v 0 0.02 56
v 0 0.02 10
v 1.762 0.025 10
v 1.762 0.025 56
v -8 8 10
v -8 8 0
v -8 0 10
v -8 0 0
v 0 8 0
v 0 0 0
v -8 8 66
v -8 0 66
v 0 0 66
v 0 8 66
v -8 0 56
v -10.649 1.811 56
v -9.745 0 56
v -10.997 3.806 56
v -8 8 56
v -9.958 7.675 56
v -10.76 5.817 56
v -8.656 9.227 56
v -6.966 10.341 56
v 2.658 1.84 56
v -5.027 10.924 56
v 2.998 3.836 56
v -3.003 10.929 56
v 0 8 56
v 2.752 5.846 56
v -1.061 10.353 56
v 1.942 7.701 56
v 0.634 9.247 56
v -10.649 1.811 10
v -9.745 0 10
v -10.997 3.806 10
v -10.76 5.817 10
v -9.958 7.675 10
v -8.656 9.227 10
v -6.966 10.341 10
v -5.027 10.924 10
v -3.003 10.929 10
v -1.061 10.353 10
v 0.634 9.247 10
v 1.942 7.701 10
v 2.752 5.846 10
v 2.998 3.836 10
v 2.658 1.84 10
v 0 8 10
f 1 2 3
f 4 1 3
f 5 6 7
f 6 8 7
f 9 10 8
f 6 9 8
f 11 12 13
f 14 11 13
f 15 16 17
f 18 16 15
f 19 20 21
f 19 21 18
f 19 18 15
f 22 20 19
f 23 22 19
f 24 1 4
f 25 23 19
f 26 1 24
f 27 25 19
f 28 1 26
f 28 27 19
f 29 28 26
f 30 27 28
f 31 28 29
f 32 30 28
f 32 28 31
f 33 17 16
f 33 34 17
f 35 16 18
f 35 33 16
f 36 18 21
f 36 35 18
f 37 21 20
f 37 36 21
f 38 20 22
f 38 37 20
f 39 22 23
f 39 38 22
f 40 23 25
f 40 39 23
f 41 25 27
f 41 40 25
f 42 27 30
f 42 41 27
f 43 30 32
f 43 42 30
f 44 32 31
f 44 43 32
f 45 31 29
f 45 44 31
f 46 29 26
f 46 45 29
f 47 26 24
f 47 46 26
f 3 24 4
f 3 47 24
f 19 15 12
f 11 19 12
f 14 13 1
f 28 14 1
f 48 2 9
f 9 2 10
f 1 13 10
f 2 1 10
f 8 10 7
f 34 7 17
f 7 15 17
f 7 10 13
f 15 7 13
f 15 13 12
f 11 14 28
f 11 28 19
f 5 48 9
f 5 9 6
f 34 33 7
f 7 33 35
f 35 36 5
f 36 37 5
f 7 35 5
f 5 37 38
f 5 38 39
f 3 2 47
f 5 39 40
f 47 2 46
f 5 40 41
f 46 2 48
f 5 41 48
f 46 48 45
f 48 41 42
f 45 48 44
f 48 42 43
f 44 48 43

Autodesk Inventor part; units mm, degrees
ref_plane "YZ Plane" through (0, 0, 0) normal (1, 0, 0) x (0, 1, 0)
ref_plane "XZ Plane" through (0, 0, 0) normal (0, 1, 0) x (-1, 0, 0)
sketch "Boceto1" plane through (0, 0, 0) normal (0, 1, 0) x (-1, 0, 0)
  line L0 (0, 0) -> (8, 0)
  line L1 (8, 0) -> (8, 66)
  line L2 (8, 66) -> (0, 66)
  line L3 (0, 66) -> (0, 0)
  dimension "d0" = 8
  dimension "d1" = 66
extrude "Extrusión1" add sketch "Boceto1" along normal blind 8
ref_plane "Plano de trabajo1" through (-12.4, 18.08, 10) normal (0, 0, 1) x (1, 0, 0)
sketch "Boceto2" plane through (-12.4, 18.08, 10) normal (0, 0, 1) x (1, 0, 0)
  line L0 (4.4, -18.08) -> (12.4, -18.08) projected
  line L1 (12.4, -18.08) -> (12.4, -10.08) projected
  line L2 (4.4, -10.08) -> (12.4, -10.08) projected
  line L3 (4.4, -18.08) -> (4.4, -10.08) projected
  line L4 (8.4, -18.08) -> (8.4, -7.08)
  circle A0 centre (8.4, -14.08) radius 7
  line L5 (4.4, -18.08) -> (2.6554, -18.08)
  line L6 (4.4, -18.08) -> (14.1617, -18.0553)
  point P0 (12.4, -18.0597)
  dimension "d4" = 11
ref_plane "Plano de trabajo2" through (-29.9, -16.92, 56) normal (0, 0, -1) x (0, 1, 0)
extrude "Extrusión2" add sketch "Boceto2" along normal up to surface (46 mm away) contours L6 L4 L0 | L5 A0 L4 L2 L3 | L3 L2 L4 L6 | L4 L6 L1 L0 | L4 L2 L1 L6 | L4 A0 L6 L1 L2
properties part number "Refuerzo bisagra"
